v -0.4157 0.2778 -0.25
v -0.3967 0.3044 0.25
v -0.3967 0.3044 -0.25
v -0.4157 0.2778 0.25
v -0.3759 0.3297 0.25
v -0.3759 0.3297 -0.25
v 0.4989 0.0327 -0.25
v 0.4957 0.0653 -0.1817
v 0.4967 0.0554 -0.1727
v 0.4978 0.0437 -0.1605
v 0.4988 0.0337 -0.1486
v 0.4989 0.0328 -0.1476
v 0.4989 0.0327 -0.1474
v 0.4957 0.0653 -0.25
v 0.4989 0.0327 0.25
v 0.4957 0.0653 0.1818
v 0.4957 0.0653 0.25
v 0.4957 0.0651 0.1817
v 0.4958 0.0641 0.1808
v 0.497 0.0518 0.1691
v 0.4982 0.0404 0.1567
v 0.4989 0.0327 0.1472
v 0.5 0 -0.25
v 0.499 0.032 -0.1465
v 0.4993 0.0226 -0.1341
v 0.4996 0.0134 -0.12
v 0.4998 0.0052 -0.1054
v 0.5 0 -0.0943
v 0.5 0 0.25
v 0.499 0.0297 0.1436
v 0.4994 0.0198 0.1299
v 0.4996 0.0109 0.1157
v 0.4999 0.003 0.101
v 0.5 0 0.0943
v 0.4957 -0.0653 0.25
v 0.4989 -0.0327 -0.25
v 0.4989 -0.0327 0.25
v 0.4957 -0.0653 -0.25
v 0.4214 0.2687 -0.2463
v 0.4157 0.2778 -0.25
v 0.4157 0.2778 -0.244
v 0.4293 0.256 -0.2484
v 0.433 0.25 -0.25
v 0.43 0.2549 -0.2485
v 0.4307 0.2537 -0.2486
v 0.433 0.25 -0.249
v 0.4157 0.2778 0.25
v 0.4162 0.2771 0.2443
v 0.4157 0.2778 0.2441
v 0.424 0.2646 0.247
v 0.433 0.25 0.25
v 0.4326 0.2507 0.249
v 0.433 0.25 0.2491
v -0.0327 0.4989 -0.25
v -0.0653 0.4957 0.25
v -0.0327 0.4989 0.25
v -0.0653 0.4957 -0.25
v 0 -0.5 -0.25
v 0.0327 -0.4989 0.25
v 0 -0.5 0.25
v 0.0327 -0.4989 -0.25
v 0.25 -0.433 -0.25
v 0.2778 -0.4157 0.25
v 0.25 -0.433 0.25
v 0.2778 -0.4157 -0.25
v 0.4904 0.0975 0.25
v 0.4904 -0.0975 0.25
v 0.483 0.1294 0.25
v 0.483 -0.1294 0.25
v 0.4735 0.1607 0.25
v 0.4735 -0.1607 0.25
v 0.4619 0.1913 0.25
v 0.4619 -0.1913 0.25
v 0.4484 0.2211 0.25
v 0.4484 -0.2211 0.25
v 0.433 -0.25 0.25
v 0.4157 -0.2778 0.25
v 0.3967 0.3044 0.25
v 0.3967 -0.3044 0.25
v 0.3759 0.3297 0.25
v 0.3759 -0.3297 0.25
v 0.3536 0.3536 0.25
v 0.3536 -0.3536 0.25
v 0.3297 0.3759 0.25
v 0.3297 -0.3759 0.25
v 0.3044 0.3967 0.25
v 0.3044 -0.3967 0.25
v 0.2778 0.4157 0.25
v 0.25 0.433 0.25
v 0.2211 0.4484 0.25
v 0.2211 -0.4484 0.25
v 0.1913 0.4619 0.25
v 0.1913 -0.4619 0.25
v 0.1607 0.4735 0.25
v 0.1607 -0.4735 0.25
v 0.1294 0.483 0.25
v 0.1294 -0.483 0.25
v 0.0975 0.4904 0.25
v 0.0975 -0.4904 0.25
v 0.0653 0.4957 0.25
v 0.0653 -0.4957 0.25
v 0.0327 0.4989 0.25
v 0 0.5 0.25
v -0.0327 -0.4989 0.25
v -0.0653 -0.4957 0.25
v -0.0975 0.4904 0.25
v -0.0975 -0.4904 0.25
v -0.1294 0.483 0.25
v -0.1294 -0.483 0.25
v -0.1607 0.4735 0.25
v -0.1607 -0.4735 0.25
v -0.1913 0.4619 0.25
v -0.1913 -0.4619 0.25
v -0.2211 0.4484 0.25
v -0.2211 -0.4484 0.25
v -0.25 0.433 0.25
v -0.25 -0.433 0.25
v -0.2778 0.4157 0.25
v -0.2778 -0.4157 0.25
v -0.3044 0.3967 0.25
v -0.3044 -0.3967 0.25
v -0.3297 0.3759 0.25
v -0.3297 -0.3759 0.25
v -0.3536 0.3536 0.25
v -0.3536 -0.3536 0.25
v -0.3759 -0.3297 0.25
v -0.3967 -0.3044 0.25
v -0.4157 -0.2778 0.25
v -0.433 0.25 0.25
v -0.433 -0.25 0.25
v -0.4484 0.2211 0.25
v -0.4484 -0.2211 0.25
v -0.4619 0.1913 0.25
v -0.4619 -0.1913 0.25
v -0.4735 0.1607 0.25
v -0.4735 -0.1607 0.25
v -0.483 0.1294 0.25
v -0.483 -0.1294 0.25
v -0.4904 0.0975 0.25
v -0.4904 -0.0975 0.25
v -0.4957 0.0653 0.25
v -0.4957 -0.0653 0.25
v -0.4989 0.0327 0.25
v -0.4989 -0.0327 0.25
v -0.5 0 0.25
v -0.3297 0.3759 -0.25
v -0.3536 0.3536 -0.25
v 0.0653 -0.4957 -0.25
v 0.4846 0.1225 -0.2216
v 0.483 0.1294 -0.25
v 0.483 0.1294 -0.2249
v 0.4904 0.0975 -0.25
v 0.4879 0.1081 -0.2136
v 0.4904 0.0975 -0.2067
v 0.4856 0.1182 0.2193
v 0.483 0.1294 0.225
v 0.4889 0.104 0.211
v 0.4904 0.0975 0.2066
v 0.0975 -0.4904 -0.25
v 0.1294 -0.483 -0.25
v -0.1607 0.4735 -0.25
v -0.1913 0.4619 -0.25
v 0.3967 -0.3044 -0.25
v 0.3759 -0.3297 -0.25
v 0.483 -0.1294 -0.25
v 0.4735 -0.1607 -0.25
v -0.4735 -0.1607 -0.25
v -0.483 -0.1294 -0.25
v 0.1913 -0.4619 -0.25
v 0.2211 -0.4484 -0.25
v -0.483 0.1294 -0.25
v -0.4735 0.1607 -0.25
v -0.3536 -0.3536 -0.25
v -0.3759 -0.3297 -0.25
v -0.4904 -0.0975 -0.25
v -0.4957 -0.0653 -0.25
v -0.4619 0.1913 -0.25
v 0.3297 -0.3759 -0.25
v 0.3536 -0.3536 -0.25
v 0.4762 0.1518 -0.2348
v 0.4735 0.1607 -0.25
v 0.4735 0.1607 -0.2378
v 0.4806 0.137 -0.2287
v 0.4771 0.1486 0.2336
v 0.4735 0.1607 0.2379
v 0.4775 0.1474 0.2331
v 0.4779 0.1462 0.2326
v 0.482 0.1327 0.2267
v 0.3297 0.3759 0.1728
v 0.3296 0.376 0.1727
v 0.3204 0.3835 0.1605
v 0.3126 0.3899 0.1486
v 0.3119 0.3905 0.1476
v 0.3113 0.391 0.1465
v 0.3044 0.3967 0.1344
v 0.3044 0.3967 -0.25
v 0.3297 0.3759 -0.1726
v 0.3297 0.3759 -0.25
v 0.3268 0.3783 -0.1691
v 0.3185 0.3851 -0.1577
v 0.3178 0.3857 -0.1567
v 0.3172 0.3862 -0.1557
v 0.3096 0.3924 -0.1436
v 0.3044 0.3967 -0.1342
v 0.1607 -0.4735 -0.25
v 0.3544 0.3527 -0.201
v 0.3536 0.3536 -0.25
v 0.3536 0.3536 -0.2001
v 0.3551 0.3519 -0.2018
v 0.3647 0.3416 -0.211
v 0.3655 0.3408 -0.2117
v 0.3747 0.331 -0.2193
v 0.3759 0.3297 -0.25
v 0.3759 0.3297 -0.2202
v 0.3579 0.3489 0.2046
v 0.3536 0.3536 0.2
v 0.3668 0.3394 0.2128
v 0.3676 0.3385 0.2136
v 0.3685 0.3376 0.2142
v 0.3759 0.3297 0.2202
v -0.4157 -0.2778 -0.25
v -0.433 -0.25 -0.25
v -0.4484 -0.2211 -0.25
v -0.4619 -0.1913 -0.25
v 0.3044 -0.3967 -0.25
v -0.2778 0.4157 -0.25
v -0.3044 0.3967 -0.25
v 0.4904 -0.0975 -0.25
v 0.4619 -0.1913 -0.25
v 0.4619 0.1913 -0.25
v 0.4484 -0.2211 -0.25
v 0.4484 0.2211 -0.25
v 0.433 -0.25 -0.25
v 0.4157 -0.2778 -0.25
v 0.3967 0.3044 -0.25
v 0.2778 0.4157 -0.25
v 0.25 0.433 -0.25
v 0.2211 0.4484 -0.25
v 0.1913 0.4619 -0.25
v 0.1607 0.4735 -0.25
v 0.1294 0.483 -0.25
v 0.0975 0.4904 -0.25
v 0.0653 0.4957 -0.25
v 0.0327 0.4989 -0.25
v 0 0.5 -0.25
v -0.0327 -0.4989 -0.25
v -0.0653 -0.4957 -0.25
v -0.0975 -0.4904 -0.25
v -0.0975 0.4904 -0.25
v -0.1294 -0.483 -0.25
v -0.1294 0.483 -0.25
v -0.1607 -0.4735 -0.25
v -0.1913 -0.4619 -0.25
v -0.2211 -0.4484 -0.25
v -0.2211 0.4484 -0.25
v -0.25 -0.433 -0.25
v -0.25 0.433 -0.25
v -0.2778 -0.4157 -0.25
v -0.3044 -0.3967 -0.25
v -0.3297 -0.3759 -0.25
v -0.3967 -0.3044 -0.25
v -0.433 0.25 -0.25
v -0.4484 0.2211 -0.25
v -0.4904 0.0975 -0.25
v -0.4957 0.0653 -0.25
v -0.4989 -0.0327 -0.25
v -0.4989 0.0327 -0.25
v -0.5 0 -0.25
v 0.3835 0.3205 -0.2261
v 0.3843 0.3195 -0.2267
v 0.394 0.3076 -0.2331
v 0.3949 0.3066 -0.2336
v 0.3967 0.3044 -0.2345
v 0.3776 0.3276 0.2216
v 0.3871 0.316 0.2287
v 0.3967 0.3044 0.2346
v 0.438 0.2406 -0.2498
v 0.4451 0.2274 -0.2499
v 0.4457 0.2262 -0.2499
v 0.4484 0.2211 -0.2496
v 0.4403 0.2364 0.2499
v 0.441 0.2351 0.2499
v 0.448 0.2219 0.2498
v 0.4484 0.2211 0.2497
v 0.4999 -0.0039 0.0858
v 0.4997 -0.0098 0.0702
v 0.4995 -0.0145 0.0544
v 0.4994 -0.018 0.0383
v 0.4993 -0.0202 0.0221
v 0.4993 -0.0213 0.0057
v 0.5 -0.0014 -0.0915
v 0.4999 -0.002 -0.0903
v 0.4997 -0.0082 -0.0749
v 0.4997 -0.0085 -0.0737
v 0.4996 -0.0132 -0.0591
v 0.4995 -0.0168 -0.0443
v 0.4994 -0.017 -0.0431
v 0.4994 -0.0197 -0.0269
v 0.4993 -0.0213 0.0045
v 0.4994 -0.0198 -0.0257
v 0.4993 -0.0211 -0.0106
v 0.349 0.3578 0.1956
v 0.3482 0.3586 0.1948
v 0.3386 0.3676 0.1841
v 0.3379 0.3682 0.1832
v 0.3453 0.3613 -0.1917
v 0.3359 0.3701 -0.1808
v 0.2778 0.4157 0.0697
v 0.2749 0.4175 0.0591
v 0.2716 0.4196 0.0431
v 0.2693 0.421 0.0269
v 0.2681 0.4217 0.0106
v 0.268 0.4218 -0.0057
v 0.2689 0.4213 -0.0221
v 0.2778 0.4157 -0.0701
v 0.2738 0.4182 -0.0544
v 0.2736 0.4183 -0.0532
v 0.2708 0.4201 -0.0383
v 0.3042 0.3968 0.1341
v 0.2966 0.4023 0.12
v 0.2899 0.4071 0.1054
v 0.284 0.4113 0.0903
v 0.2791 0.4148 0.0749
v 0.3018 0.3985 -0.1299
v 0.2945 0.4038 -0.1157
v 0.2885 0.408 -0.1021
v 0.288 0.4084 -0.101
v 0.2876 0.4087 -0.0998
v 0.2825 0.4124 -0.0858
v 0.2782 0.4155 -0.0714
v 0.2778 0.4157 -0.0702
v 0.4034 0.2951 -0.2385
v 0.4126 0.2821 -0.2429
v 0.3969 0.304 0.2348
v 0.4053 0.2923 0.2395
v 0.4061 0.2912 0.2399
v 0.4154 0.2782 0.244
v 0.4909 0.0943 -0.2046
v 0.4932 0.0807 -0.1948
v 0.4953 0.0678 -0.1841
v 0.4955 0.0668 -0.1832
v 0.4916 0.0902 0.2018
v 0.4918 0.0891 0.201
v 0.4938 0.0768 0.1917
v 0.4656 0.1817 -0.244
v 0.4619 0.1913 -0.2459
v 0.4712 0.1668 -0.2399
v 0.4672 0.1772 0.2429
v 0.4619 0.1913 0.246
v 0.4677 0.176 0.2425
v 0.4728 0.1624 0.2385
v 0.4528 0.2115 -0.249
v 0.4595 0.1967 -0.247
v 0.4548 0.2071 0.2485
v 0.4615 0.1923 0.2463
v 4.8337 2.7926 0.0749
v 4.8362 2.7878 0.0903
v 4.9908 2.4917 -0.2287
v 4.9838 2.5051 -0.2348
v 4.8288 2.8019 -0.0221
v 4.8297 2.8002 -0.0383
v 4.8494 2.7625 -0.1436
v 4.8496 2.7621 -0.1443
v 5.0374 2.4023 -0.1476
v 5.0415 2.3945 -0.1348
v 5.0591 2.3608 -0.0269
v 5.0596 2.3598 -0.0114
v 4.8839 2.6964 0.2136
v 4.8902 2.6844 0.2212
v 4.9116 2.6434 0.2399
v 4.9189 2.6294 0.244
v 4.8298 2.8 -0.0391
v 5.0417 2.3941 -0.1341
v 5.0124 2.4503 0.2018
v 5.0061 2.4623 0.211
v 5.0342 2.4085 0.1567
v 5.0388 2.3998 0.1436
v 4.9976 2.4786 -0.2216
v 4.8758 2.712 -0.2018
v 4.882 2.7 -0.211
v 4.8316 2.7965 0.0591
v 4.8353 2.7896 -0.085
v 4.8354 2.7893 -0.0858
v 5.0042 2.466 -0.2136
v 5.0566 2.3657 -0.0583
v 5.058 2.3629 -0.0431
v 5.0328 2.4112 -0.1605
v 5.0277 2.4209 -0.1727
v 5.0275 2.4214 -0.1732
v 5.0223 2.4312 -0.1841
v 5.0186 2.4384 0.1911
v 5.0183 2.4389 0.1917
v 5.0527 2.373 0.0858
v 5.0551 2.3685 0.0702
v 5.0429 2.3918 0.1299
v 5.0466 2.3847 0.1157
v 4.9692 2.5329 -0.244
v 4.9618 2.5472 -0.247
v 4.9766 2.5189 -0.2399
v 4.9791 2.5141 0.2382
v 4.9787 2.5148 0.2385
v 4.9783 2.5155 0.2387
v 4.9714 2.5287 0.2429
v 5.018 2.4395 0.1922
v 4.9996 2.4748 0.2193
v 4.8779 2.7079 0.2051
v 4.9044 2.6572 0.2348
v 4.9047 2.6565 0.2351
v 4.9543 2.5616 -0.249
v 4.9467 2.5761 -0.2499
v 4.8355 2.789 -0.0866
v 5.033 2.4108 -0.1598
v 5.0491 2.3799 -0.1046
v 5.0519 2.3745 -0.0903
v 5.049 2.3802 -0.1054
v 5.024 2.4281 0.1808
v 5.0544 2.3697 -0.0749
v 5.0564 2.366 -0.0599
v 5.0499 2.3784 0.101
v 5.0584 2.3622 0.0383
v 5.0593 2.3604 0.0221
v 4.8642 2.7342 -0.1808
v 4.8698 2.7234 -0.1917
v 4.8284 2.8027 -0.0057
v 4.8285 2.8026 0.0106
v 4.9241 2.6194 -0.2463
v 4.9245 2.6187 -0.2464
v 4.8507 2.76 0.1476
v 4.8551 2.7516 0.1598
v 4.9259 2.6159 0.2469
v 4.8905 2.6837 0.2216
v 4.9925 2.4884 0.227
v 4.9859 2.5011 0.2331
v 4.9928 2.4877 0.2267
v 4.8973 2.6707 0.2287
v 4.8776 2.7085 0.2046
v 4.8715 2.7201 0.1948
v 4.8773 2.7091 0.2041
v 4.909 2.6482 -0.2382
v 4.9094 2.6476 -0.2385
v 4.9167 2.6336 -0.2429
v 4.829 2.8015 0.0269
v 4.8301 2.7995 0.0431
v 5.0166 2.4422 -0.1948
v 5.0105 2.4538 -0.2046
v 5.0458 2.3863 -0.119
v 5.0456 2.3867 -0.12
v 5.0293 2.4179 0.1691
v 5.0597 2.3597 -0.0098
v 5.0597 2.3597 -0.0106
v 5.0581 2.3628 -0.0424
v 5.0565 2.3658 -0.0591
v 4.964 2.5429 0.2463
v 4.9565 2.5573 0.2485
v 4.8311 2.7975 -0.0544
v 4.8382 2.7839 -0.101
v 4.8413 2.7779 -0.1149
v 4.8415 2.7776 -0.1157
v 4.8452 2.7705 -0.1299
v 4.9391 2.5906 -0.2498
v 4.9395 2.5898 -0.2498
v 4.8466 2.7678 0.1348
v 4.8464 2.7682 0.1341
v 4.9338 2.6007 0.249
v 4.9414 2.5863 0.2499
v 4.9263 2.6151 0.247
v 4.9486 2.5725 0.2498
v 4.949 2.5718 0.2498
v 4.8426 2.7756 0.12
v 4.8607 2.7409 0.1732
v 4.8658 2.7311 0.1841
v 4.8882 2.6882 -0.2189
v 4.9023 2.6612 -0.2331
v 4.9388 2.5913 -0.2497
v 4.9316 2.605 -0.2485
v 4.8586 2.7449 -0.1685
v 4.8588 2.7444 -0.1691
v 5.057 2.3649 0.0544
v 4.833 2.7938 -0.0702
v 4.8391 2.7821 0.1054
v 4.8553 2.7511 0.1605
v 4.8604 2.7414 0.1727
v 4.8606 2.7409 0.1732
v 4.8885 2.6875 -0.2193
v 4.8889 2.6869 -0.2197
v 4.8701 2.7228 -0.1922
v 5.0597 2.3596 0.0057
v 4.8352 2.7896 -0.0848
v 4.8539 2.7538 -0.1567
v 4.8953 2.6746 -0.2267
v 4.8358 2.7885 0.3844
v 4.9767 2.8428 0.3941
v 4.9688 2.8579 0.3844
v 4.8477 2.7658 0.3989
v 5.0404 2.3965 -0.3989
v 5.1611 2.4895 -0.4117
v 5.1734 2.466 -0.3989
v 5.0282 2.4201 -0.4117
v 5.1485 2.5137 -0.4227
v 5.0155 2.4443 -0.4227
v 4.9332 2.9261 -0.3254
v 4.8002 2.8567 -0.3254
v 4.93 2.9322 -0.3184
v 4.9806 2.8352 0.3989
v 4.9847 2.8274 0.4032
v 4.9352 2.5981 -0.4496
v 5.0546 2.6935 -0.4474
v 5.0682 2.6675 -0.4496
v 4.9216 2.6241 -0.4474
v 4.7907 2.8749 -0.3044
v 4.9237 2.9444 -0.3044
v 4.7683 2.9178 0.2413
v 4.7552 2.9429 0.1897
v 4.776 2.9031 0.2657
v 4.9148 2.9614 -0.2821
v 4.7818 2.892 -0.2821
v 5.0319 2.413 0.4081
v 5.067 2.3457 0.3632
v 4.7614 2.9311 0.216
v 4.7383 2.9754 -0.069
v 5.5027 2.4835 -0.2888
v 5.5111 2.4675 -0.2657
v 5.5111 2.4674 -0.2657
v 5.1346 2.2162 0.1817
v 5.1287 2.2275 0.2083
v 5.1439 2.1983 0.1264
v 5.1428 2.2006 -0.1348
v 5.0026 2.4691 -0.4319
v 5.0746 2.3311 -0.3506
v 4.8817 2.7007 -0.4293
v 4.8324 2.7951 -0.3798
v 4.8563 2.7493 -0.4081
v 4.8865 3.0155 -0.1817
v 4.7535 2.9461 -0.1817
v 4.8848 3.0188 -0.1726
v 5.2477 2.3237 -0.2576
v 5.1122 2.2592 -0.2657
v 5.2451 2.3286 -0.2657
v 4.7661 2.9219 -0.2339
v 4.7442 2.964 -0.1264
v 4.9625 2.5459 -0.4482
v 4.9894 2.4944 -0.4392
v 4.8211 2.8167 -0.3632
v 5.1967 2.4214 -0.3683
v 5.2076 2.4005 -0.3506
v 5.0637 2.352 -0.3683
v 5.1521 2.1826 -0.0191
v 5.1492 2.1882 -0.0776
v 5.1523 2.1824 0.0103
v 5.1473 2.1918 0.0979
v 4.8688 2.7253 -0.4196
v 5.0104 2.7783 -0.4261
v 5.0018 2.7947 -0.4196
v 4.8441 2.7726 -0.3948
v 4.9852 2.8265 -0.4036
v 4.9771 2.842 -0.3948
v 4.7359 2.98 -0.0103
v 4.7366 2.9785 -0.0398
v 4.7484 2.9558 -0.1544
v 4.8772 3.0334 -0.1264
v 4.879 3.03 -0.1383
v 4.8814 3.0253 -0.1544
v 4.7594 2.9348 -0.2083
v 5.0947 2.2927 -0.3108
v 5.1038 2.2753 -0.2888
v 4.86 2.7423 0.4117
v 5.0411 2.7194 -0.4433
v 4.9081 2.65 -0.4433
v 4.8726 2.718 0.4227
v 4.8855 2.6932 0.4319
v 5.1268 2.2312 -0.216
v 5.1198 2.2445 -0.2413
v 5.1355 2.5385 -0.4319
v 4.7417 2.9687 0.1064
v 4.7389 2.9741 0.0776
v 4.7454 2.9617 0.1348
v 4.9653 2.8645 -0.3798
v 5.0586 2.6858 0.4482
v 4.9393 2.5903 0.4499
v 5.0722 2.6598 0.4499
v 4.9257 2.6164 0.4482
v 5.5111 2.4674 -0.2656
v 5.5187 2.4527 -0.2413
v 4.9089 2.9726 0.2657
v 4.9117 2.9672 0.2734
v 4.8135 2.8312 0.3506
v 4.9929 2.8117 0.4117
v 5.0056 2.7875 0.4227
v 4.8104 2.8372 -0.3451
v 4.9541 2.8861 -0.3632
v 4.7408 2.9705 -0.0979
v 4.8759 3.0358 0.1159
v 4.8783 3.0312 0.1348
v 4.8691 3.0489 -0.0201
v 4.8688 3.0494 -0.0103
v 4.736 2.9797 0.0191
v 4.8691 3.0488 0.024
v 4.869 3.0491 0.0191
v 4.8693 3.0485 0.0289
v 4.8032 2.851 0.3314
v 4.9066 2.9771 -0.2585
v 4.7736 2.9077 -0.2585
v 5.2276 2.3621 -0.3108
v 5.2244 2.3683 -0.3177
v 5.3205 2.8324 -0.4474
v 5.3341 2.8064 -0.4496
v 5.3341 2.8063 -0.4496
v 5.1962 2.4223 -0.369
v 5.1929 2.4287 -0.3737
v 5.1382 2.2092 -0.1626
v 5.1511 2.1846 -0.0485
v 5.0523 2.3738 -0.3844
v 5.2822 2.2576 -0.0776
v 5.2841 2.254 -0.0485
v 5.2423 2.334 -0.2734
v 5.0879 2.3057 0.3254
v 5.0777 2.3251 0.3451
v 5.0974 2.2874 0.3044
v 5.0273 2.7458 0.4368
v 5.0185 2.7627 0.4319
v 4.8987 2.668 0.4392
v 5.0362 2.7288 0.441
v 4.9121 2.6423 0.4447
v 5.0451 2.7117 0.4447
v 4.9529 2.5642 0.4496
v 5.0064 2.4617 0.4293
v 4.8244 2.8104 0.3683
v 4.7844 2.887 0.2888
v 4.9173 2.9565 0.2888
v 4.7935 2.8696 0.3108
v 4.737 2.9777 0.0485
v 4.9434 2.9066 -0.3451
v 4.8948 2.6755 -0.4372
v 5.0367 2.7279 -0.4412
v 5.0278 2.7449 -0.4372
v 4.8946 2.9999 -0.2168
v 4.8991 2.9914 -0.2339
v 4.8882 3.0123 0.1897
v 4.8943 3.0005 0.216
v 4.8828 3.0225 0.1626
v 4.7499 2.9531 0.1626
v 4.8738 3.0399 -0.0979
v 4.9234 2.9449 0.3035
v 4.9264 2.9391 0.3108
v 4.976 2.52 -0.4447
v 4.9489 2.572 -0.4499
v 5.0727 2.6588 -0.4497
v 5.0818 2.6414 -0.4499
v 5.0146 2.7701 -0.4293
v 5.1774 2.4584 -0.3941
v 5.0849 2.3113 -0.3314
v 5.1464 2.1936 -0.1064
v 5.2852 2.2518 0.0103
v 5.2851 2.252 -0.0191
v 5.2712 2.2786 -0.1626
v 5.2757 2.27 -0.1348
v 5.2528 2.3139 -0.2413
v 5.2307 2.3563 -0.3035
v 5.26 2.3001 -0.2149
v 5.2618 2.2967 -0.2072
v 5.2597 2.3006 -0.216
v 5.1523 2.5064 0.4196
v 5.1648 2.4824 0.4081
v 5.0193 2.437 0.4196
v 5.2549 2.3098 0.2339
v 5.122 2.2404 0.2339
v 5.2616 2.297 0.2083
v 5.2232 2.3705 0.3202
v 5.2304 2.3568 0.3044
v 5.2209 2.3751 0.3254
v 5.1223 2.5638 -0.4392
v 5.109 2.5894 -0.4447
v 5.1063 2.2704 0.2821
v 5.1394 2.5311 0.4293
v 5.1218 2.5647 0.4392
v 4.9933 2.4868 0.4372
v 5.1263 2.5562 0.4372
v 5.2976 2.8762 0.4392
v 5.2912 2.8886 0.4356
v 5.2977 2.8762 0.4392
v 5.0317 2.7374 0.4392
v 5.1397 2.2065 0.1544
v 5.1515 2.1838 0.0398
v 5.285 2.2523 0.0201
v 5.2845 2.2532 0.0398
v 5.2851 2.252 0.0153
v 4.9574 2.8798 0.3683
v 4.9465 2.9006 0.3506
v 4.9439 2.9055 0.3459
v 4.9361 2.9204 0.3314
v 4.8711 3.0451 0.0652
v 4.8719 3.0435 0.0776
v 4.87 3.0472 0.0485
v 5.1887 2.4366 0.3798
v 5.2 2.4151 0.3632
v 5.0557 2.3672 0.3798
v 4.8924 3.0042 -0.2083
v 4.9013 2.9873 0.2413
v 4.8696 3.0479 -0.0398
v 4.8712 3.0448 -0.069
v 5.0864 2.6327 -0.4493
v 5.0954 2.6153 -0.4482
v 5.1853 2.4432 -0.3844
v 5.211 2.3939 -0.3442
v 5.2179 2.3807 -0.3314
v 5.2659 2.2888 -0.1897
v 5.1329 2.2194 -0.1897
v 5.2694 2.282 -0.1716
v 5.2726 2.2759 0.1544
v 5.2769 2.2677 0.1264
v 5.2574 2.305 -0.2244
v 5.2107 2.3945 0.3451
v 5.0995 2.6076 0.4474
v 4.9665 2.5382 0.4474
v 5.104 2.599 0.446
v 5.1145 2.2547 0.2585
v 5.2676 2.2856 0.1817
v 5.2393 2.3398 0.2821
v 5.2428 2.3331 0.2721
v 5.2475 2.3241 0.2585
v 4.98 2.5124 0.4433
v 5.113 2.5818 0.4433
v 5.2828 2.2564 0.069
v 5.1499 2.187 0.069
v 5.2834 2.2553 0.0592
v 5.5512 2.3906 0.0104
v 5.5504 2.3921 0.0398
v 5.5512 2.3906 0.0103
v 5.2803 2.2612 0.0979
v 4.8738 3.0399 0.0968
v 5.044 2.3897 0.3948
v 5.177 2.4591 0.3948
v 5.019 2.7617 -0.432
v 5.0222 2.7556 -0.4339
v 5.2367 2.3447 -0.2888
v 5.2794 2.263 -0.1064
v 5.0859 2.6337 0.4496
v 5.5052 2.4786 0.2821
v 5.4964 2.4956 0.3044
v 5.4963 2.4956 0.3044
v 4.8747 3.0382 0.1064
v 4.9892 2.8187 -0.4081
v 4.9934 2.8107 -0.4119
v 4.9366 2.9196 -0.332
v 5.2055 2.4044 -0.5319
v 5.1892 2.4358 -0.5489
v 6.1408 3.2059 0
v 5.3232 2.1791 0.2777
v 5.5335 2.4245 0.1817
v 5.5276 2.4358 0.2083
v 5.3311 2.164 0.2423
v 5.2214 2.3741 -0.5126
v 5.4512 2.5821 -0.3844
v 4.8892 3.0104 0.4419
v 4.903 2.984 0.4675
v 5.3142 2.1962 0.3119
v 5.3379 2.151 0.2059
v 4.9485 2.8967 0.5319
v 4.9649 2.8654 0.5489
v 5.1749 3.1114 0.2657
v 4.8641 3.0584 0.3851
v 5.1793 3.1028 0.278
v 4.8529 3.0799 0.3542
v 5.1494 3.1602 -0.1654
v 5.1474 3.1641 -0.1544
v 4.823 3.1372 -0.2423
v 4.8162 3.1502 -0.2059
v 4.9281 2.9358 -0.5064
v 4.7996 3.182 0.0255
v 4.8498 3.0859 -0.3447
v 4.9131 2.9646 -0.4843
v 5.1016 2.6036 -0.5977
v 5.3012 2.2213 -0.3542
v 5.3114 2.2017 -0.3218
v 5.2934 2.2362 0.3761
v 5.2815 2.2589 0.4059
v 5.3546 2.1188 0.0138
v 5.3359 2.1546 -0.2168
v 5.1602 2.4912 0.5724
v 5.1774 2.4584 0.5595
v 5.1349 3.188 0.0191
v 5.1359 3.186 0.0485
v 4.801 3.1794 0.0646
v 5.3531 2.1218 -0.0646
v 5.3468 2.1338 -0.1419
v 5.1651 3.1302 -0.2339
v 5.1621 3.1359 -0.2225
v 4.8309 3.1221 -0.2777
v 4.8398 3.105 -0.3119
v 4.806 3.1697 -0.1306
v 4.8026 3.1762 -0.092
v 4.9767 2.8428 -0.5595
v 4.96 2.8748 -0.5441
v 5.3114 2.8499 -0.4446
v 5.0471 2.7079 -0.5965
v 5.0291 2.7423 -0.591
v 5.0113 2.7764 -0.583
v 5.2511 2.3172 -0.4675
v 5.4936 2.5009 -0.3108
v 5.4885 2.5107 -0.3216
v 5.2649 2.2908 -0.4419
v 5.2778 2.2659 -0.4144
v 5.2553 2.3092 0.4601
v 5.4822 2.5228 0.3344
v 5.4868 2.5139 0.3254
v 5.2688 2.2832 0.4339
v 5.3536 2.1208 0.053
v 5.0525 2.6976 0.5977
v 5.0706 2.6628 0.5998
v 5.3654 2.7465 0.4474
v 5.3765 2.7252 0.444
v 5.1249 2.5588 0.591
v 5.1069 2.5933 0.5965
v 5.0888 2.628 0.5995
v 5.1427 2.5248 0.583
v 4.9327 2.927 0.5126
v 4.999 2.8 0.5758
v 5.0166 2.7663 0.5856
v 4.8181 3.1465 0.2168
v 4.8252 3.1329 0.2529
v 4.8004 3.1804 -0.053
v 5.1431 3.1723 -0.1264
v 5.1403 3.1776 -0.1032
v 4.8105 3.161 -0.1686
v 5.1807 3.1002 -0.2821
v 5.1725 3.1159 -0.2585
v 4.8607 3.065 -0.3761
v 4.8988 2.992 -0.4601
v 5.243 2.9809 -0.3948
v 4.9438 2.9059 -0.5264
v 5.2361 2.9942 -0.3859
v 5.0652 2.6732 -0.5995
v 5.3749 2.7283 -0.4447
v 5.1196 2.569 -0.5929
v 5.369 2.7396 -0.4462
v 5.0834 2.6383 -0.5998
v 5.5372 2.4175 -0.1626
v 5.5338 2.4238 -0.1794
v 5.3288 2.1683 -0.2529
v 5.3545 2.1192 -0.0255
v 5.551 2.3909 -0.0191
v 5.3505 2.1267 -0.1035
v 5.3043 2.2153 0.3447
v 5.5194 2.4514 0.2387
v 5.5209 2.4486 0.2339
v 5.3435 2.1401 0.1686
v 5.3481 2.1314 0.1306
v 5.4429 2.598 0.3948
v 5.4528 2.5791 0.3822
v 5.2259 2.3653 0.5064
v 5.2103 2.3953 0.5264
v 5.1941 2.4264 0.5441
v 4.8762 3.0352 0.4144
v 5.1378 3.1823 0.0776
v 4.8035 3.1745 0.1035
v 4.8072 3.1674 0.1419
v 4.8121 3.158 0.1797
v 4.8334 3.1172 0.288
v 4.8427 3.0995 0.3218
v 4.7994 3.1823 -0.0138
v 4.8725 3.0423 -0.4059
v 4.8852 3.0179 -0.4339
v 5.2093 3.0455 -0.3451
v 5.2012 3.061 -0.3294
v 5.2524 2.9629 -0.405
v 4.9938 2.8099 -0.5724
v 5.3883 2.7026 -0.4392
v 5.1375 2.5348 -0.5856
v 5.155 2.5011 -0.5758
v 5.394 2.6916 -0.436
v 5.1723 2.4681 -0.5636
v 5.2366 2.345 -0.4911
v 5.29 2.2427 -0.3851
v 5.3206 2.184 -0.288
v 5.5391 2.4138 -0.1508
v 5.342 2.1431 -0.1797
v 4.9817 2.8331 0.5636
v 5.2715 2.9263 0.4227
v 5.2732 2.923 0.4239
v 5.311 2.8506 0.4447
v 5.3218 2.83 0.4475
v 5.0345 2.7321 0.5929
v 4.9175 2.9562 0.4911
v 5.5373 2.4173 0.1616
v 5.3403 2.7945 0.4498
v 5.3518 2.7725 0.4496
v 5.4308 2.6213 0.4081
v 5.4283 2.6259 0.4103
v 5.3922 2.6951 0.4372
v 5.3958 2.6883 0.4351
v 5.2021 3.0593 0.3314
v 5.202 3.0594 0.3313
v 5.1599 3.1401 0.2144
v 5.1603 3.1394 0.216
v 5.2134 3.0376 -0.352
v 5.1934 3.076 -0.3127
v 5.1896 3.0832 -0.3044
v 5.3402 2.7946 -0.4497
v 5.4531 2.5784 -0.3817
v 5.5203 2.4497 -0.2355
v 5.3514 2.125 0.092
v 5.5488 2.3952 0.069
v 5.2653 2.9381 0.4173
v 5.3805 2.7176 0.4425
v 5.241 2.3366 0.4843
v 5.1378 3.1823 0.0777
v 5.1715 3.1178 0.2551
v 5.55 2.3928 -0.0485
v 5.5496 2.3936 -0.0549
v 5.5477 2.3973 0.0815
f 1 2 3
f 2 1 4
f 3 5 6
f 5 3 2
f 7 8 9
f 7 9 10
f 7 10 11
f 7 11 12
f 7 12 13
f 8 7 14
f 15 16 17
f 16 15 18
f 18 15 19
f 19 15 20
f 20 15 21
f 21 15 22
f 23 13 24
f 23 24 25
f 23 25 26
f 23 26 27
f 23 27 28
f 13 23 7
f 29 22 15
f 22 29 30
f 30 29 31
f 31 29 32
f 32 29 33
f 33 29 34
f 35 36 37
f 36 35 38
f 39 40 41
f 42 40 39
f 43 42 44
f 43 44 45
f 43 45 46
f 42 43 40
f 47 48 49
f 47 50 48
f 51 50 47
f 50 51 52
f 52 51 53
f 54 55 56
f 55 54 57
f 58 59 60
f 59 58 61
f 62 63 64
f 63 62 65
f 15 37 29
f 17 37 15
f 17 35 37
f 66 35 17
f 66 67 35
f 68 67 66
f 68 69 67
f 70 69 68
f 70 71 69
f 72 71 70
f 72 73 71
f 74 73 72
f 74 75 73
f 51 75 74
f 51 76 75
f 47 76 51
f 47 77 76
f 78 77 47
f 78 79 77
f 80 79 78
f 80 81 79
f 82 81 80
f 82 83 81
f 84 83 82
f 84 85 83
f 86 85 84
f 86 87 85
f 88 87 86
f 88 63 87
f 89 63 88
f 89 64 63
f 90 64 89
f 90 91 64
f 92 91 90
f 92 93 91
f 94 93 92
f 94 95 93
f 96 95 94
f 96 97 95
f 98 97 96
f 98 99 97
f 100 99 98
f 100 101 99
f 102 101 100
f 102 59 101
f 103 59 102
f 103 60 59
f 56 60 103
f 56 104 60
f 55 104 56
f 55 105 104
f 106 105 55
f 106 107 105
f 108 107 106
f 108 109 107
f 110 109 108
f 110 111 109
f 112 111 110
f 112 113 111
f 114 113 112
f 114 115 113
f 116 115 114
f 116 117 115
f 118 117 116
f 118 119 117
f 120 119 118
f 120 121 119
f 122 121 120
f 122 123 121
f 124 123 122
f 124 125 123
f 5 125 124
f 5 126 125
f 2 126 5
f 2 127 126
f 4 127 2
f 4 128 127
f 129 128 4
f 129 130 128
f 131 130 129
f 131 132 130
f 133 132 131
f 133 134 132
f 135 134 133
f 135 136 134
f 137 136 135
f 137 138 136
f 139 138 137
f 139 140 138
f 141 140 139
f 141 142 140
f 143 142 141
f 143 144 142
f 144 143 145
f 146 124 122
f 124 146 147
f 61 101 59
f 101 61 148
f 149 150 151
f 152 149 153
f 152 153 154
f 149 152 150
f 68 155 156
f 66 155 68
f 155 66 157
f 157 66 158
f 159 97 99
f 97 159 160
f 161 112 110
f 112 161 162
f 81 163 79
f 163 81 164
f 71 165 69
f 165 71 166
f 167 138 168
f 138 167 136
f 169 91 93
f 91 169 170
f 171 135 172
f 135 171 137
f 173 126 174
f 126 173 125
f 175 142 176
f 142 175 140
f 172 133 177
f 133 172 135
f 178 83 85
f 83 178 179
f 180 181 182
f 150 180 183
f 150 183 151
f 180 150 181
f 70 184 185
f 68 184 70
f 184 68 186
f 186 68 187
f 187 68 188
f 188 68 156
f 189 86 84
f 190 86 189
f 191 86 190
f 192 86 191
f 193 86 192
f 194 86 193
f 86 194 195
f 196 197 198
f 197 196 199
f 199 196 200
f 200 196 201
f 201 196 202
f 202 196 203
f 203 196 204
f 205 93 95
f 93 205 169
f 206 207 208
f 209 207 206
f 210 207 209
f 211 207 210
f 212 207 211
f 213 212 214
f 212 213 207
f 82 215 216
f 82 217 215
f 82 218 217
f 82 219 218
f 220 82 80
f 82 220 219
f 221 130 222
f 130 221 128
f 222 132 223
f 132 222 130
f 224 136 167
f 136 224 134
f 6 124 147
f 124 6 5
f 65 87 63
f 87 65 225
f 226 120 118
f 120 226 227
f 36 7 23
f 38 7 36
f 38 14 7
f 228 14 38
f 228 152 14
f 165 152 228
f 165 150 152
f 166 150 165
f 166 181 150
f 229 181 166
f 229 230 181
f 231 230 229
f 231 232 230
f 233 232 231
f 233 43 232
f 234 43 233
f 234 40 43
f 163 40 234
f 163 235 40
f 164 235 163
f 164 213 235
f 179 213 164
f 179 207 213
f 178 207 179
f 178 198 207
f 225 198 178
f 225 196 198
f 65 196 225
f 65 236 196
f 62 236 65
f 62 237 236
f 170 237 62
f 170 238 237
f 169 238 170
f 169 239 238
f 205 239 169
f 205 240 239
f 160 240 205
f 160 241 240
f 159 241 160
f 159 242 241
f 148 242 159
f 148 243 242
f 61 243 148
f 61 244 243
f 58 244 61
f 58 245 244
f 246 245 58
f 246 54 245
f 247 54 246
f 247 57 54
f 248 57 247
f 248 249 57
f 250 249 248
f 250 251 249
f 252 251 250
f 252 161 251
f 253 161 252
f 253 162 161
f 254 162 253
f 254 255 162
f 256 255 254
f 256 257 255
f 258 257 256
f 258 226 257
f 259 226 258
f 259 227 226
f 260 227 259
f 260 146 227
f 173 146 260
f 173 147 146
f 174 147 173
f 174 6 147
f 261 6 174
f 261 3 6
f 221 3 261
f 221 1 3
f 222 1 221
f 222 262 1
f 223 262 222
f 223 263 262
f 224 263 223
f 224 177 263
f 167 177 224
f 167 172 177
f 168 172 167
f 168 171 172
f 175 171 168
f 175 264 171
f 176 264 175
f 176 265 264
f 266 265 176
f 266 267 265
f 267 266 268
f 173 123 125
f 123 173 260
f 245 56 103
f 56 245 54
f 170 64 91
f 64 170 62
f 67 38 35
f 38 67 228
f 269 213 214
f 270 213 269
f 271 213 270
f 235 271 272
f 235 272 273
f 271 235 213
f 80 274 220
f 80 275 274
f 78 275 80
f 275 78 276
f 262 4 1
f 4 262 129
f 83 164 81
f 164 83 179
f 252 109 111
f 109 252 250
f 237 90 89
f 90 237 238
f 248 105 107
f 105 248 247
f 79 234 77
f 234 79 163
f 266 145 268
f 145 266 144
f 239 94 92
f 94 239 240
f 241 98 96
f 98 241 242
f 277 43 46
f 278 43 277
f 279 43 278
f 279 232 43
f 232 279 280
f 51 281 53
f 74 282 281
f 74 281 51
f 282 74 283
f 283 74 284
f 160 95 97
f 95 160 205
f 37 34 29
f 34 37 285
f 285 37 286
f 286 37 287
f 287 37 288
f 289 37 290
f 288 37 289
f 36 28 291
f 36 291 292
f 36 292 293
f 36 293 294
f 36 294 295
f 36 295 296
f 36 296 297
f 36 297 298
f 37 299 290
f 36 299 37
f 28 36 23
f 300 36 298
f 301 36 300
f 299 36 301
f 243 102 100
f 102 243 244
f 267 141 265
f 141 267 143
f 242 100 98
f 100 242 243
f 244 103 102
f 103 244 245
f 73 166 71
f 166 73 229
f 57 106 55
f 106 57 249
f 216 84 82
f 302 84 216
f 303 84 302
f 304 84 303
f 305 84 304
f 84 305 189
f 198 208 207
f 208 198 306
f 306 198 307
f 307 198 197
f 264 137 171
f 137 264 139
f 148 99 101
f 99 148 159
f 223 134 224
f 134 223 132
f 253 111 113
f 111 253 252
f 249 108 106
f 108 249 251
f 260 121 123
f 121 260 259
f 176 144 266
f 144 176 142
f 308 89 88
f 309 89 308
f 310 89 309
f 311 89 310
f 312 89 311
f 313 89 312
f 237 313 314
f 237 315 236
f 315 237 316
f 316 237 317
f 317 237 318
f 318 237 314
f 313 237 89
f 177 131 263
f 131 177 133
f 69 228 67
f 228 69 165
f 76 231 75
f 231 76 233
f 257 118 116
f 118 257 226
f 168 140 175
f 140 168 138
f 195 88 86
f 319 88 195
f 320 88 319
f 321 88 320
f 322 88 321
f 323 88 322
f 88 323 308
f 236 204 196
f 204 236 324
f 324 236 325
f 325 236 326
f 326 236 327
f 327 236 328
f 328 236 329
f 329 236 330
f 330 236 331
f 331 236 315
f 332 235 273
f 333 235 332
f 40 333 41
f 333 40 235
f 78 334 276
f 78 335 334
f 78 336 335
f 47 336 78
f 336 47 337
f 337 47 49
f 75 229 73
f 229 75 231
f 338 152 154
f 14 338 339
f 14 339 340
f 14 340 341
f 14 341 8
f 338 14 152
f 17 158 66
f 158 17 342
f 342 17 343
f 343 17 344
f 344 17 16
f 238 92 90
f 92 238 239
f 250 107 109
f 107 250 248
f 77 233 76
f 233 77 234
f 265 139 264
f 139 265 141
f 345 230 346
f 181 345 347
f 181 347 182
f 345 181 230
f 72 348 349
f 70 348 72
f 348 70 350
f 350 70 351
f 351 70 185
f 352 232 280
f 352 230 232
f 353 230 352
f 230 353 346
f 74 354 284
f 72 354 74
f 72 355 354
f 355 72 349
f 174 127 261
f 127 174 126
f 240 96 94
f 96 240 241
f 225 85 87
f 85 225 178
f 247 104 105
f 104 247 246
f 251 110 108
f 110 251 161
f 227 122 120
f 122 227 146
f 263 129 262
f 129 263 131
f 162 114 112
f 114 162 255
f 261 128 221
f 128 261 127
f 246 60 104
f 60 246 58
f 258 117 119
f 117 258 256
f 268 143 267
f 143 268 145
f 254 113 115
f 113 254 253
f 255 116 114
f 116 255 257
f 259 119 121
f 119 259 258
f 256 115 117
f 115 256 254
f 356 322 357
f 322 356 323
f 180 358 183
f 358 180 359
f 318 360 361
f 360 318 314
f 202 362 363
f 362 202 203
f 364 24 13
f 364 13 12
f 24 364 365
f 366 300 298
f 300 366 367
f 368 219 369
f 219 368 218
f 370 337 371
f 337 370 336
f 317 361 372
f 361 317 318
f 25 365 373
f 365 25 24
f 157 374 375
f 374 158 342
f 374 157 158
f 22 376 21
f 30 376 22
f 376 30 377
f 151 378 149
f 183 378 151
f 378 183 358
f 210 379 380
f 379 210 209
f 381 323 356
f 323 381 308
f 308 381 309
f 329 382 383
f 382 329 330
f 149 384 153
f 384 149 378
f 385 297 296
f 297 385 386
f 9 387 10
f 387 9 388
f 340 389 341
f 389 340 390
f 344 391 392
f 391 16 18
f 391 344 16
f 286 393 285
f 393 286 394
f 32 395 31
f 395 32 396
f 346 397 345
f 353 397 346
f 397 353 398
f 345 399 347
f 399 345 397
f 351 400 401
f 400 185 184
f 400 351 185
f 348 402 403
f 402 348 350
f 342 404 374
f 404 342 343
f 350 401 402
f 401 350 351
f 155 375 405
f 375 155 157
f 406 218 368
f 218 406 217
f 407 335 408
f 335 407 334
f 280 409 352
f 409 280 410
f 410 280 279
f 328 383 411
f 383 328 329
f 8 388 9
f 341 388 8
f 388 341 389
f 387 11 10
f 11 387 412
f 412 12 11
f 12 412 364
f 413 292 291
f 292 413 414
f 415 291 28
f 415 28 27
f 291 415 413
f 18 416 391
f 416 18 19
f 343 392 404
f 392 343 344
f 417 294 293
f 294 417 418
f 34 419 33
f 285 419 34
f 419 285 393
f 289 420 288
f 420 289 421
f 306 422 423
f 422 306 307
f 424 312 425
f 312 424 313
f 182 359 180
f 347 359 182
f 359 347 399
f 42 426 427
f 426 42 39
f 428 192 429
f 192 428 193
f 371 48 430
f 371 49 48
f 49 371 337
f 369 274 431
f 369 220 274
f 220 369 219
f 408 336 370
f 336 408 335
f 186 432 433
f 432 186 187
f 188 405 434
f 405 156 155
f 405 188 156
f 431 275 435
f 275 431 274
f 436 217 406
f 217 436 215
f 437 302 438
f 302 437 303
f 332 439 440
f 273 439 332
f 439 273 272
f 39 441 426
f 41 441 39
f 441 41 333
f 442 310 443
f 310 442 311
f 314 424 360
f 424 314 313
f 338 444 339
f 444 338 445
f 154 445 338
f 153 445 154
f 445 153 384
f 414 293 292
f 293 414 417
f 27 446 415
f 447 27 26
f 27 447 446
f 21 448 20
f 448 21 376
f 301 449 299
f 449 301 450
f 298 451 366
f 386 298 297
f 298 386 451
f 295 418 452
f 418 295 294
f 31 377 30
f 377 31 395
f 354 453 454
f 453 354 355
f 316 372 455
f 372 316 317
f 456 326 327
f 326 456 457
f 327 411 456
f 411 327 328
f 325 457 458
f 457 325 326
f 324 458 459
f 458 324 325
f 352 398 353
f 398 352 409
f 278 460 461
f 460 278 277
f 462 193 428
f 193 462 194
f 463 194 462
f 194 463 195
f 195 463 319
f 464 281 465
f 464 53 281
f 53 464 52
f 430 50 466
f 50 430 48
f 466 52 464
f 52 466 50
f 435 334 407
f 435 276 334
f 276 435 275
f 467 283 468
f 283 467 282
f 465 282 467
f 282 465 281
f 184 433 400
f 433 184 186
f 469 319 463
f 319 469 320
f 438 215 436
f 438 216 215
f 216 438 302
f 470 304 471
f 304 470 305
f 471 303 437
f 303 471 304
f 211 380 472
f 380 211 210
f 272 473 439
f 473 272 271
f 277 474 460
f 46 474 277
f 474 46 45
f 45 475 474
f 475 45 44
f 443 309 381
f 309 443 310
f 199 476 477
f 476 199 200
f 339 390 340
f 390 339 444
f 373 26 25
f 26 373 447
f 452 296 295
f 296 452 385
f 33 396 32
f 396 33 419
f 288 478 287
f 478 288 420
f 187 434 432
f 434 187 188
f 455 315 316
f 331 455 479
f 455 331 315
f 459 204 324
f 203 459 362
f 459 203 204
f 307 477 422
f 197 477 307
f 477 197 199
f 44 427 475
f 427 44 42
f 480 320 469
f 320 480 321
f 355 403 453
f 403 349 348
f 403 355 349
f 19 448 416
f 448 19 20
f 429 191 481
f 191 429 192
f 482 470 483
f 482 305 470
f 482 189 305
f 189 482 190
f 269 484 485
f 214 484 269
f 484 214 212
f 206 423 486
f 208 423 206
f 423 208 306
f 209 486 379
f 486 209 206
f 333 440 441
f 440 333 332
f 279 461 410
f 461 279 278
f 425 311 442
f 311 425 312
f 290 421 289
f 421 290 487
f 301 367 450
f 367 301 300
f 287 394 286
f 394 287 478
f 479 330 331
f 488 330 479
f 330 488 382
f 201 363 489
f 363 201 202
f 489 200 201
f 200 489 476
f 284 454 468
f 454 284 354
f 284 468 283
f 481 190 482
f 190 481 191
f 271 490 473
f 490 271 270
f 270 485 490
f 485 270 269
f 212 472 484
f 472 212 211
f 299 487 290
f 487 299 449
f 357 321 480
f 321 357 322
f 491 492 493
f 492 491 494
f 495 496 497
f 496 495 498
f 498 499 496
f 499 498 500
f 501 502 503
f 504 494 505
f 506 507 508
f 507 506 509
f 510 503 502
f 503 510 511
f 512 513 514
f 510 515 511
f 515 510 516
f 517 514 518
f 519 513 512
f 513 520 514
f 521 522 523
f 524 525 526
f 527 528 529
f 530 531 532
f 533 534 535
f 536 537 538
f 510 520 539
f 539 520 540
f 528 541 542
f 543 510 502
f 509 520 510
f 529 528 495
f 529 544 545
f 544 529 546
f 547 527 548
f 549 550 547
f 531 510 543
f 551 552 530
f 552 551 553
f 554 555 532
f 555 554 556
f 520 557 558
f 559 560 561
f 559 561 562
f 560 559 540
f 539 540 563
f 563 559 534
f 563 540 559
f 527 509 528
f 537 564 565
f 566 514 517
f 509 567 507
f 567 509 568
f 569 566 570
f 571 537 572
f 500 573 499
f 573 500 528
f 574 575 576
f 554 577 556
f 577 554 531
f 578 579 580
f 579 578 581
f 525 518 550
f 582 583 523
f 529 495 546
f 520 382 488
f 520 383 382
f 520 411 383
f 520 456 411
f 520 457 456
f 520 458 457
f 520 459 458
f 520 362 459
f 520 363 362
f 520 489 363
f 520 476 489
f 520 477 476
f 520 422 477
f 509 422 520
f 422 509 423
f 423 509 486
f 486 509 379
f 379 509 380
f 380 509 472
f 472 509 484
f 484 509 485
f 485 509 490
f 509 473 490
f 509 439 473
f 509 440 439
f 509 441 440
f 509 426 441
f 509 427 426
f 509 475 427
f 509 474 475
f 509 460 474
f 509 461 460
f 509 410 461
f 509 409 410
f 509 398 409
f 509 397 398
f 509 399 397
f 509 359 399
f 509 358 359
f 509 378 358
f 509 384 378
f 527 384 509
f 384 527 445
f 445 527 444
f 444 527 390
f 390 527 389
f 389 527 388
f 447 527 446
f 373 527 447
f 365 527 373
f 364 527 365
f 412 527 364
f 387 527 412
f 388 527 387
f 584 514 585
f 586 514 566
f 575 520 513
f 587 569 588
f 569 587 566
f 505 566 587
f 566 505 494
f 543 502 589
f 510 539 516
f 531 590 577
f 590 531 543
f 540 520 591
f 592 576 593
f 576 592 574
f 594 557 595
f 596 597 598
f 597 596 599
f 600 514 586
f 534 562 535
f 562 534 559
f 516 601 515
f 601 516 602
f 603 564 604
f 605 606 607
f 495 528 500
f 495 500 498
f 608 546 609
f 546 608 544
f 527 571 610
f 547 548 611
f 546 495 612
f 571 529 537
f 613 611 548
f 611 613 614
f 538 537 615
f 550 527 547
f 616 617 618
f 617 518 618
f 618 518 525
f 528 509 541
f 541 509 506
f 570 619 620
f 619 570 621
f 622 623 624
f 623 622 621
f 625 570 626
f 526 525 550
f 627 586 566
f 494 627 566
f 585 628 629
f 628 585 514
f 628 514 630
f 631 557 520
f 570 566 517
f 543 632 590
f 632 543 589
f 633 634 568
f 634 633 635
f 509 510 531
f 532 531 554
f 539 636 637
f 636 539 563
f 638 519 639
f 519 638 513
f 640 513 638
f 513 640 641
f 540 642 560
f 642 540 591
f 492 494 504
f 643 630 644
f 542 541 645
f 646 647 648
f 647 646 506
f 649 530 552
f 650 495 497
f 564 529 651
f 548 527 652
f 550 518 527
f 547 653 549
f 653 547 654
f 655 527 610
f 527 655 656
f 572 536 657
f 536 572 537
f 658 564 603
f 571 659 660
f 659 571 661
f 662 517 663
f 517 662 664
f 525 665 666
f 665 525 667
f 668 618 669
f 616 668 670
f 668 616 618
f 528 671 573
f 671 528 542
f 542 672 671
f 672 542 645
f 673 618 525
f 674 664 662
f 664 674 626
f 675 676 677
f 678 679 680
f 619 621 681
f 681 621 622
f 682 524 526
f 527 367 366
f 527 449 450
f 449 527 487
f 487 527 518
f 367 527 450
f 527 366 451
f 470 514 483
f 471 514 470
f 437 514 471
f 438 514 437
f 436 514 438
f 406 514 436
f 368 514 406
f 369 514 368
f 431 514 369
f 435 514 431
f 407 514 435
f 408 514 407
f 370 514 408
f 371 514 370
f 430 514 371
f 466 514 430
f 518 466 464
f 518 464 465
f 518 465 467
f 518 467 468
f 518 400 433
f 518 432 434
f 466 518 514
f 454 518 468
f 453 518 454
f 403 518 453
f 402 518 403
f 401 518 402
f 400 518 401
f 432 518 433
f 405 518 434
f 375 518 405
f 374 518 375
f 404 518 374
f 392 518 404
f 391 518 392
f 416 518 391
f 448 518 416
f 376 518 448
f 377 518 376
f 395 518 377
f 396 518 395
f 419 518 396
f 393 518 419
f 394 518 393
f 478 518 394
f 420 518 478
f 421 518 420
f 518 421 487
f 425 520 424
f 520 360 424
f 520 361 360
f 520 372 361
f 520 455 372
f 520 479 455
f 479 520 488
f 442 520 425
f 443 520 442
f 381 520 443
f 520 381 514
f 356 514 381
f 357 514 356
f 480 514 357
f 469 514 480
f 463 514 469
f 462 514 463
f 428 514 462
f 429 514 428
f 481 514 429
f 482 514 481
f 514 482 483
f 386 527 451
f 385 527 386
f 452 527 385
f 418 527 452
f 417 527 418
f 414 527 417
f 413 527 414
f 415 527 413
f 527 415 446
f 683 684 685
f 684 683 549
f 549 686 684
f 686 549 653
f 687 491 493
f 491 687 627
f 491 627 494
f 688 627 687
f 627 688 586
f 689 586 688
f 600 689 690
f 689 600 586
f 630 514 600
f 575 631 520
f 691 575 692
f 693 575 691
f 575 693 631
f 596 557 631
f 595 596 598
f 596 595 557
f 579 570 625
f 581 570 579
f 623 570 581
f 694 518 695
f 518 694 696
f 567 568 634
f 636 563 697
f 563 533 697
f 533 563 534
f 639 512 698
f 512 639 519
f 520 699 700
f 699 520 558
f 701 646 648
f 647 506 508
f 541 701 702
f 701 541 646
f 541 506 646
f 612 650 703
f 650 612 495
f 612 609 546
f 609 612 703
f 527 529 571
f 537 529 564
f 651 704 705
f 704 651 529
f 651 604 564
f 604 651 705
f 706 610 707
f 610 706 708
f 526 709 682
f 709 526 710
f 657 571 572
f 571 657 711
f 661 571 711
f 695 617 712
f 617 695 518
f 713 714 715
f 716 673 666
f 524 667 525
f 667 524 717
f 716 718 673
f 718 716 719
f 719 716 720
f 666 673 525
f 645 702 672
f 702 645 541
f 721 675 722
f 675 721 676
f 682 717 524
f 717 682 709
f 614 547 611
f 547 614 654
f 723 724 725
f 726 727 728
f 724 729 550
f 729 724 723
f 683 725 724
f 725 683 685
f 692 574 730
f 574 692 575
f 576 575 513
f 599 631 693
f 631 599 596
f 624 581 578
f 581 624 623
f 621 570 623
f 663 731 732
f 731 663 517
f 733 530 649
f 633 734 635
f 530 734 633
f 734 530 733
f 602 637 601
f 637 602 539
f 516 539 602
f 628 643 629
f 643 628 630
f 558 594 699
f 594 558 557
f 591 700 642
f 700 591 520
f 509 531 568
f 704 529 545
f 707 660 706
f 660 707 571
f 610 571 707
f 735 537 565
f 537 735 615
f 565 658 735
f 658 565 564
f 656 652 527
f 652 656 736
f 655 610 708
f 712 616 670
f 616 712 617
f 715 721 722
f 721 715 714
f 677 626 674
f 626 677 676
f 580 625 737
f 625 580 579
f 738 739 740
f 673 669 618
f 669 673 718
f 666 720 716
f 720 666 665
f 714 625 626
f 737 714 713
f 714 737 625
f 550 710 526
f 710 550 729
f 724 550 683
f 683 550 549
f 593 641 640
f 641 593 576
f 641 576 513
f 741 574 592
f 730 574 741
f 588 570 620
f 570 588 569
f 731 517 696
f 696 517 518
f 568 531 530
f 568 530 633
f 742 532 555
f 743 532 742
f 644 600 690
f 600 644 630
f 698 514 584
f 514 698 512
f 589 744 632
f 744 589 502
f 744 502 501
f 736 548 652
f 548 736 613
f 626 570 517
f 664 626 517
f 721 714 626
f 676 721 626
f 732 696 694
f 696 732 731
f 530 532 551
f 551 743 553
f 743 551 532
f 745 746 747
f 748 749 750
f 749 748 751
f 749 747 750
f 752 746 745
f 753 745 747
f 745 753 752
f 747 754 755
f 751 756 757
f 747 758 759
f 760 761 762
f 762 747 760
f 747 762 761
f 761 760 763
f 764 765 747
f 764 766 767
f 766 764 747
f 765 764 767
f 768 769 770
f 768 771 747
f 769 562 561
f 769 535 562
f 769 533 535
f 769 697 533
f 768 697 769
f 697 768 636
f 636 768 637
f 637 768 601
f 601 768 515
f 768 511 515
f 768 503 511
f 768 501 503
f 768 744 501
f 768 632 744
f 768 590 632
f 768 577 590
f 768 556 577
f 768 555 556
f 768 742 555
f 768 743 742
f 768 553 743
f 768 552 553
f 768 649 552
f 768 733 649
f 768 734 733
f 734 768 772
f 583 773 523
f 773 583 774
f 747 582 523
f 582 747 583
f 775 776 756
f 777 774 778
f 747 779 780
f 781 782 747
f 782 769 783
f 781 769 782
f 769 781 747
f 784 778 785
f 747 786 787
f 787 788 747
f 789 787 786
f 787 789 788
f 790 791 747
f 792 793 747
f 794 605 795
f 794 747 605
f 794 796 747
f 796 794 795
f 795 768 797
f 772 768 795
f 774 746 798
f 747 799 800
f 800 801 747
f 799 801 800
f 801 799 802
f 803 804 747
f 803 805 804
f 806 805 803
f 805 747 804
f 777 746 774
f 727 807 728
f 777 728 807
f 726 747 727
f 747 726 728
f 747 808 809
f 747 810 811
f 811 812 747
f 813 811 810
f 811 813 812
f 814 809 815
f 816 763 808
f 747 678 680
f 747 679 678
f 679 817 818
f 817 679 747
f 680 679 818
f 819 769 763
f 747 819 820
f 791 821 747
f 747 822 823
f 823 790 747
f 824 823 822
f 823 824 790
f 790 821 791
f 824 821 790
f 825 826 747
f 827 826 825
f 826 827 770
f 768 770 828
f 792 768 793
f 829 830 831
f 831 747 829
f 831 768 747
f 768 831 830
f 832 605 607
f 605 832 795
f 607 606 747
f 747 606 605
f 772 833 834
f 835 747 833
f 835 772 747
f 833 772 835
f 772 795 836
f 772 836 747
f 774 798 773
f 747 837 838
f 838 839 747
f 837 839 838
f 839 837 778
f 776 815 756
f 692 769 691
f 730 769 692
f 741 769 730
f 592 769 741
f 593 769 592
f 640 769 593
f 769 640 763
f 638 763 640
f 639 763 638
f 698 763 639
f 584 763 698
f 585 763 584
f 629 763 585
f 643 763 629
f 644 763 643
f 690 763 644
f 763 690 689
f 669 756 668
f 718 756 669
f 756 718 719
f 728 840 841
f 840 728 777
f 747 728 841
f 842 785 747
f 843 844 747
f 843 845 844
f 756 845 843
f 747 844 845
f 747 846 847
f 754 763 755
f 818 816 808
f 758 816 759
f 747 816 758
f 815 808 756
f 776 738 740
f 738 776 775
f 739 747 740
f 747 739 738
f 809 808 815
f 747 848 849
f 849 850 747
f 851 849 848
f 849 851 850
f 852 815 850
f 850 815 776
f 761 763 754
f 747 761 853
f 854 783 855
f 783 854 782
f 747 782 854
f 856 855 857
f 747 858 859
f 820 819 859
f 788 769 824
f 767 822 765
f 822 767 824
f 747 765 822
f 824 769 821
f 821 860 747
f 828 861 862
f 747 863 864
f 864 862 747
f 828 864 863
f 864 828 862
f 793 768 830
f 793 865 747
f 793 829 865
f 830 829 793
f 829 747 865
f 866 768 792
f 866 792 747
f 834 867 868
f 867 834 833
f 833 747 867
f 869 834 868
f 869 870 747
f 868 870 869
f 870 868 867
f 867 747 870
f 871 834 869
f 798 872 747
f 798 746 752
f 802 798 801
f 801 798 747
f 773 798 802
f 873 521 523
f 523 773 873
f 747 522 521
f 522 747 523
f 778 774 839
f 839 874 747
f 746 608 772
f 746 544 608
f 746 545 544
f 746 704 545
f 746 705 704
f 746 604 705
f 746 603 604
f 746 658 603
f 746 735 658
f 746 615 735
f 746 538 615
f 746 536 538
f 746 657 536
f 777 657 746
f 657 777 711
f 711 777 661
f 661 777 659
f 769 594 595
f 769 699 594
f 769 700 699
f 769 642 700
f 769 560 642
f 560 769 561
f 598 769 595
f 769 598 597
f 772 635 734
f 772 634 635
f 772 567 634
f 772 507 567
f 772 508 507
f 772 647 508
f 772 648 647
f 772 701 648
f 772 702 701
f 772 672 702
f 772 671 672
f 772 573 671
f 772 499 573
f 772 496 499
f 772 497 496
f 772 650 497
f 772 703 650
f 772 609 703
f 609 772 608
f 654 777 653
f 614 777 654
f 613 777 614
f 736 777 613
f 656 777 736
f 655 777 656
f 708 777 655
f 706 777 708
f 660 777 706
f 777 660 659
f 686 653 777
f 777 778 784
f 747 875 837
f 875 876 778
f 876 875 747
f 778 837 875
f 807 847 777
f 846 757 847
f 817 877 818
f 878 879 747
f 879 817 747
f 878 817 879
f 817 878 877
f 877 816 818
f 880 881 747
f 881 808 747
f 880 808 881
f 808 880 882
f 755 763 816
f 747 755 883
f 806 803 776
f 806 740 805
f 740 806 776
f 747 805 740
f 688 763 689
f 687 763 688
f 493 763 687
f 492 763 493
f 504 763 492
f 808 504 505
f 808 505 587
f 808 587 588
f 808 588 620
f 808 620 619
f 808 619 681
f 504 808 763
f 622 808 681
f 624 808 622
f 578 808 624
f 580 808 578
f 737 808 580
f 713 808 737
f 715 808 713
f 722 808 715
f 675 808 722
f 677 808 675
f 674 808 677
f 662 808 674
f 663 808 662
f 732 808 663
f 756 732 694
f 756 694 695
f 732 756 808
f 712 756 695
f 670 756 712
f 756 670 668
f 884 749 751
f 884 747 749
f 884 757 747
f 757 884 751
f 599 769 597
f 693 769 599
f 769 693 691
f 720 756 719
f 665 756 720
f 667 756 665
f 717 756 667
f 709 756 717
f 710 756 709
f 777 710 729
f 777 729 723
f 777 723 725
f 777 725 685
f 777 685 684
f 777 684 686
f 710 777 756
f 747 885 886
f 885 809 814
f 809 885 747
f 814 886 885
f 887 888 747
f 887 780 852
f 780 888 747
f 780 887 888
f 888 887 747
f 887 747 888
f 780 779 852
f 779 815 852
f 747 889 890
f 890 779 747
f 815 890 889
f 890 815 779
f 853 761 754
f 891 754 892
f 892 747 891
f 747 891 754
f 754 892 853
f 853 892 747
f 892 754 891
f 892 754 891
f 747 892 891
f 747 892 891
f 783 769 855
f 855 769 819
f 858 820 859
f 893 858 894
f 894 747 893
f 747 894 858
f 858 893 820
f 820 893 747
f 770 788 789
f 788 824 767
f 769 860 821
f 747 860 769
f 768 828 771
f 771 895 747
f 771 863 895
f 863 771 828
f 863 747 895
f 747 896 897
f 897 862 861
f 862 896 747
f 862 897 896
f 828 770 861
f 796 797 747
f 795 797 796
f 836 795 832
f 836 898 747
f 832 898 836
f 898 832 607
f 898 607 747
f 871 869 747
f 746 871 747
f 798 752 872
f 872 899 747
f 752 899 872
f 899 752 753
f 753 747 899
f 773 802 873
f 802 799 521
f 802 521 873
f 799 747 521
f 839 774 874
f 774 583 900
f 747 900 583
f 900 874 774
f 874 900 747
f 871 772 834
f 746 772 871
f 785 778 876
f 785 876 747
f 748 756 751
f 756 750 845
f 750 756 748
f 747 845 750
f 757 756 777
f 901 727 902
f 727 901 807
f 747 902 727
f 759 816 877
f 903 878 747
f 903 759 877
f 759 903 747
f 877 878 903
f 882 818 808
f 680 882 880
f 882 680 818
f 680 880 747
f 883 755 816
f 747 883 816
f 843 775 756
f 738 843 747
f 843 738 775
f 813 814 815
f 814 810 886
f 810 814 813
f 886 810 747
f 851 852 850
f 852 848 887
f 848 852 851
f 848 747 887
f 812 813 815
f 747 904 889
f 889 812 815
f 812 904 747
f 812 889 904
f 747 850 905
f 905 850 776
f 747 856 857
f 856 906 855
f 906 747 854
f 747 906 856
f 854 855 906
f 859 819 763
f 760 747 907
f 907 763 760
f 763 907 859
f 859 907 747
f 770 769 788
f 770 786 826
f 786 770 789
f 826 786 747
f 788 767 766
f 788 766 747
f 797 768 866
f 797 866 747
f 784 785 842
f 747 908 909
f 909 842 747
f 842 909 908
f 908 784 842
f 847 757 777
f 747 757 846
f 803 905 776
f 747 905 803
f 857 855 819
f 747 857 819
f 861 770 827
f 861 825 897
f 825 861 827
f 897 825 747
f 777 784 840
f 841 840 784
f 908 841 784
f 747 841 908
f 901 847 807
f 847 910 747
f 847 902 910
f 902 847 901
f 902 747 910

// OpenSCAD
$fn = 96;

// Requested axial vector (end point from origin)
A = [5.21, 2.72, 0];

// Geometry
rod_radius = 0.25;
origin_marker_radius = 0.5;
origin_marker_height = 0.5;
end_marker_radius = 0.45;
end_marker_height = 0.45;
arrowhead_radius = 0.6;
arrowhead_height = 1.2;

// Ensure positive overlap so the whole model is ONE connected solid
connect_overlap = 0.15;

// Helpers
function vlen(v) = sqrt(v[0]*v[0] + v[1]*v[1] + v[2]*v[2]);
function vunit(v) = let(L=vlen(v)) (L==0 ? [0,0,1] : [v[0]/L, v[1]/L, v[2]/L]);

rod_length = vlen(A);
u = vunit(A);

// Rotate +Z to direction v
module orient_to(v) {
    L = vlen(v);
    if (L == 0) {
        children();
    } else {
        axis = [-v[1], v[0], 0];                 // cross([0,0,1], v)
        axis_len = vlen(axis);
        ang = acos(v[2]/L);                      // angle between +Z and v
        if (axis_len < 1e-9) {
            if (v[2] >= 0) children();
            else rotate([180,0,0]) children();
        } else {
            rotate(a=ang, v=[axis[0]/axis_len, axis[1]/axis_len, axis[2]/axis_len])
                children();
        }
    }
}

module axis_indicator_union() {
    union() {
        // Origin marker (centered at origin)
        cylinder(h=origin_marker_height, r=origin_marker_radius, center=true);

        // Rod centered along vector A (from origin to A)
        translate([A[0]/2, A[1]/2, A[2]/2])
            orient_to(A)
                cylinder(h=rod_length, r=rod_radius, center=true);

        // End marker: overlap INTO rod by connect_overlap
        translate([
            A[0] - u[0]*(end_marker_height/2 - connect_overlap),
            A[1] - u[1]*(end_marker_height/2 - connect_overlap),
            A[2] - u[2]*(end_marker_height/2 - connect_overlap)
        ])
            orient_to(A)
                cylinder(h=end_marker_height, r=end_marker_radius, center=true);

        // Arrowhead: overlap INTO end marker by connect_overlap
        translate([
            A[0] + u[0]*(arrowhead_height/2 - connect_overlap),
            A[1] + u[1]*(arrowhead_height/2 - connect_overlap),
            A[2] + u[2]*(arrowhead_height/2 - connect_overlap)
        ])
            orient_to(A)
                cylinder(h=arrowhead_height, r1=arrowhead_radius, r2=0, center=true);
    }
}

axis_indicator_union();
